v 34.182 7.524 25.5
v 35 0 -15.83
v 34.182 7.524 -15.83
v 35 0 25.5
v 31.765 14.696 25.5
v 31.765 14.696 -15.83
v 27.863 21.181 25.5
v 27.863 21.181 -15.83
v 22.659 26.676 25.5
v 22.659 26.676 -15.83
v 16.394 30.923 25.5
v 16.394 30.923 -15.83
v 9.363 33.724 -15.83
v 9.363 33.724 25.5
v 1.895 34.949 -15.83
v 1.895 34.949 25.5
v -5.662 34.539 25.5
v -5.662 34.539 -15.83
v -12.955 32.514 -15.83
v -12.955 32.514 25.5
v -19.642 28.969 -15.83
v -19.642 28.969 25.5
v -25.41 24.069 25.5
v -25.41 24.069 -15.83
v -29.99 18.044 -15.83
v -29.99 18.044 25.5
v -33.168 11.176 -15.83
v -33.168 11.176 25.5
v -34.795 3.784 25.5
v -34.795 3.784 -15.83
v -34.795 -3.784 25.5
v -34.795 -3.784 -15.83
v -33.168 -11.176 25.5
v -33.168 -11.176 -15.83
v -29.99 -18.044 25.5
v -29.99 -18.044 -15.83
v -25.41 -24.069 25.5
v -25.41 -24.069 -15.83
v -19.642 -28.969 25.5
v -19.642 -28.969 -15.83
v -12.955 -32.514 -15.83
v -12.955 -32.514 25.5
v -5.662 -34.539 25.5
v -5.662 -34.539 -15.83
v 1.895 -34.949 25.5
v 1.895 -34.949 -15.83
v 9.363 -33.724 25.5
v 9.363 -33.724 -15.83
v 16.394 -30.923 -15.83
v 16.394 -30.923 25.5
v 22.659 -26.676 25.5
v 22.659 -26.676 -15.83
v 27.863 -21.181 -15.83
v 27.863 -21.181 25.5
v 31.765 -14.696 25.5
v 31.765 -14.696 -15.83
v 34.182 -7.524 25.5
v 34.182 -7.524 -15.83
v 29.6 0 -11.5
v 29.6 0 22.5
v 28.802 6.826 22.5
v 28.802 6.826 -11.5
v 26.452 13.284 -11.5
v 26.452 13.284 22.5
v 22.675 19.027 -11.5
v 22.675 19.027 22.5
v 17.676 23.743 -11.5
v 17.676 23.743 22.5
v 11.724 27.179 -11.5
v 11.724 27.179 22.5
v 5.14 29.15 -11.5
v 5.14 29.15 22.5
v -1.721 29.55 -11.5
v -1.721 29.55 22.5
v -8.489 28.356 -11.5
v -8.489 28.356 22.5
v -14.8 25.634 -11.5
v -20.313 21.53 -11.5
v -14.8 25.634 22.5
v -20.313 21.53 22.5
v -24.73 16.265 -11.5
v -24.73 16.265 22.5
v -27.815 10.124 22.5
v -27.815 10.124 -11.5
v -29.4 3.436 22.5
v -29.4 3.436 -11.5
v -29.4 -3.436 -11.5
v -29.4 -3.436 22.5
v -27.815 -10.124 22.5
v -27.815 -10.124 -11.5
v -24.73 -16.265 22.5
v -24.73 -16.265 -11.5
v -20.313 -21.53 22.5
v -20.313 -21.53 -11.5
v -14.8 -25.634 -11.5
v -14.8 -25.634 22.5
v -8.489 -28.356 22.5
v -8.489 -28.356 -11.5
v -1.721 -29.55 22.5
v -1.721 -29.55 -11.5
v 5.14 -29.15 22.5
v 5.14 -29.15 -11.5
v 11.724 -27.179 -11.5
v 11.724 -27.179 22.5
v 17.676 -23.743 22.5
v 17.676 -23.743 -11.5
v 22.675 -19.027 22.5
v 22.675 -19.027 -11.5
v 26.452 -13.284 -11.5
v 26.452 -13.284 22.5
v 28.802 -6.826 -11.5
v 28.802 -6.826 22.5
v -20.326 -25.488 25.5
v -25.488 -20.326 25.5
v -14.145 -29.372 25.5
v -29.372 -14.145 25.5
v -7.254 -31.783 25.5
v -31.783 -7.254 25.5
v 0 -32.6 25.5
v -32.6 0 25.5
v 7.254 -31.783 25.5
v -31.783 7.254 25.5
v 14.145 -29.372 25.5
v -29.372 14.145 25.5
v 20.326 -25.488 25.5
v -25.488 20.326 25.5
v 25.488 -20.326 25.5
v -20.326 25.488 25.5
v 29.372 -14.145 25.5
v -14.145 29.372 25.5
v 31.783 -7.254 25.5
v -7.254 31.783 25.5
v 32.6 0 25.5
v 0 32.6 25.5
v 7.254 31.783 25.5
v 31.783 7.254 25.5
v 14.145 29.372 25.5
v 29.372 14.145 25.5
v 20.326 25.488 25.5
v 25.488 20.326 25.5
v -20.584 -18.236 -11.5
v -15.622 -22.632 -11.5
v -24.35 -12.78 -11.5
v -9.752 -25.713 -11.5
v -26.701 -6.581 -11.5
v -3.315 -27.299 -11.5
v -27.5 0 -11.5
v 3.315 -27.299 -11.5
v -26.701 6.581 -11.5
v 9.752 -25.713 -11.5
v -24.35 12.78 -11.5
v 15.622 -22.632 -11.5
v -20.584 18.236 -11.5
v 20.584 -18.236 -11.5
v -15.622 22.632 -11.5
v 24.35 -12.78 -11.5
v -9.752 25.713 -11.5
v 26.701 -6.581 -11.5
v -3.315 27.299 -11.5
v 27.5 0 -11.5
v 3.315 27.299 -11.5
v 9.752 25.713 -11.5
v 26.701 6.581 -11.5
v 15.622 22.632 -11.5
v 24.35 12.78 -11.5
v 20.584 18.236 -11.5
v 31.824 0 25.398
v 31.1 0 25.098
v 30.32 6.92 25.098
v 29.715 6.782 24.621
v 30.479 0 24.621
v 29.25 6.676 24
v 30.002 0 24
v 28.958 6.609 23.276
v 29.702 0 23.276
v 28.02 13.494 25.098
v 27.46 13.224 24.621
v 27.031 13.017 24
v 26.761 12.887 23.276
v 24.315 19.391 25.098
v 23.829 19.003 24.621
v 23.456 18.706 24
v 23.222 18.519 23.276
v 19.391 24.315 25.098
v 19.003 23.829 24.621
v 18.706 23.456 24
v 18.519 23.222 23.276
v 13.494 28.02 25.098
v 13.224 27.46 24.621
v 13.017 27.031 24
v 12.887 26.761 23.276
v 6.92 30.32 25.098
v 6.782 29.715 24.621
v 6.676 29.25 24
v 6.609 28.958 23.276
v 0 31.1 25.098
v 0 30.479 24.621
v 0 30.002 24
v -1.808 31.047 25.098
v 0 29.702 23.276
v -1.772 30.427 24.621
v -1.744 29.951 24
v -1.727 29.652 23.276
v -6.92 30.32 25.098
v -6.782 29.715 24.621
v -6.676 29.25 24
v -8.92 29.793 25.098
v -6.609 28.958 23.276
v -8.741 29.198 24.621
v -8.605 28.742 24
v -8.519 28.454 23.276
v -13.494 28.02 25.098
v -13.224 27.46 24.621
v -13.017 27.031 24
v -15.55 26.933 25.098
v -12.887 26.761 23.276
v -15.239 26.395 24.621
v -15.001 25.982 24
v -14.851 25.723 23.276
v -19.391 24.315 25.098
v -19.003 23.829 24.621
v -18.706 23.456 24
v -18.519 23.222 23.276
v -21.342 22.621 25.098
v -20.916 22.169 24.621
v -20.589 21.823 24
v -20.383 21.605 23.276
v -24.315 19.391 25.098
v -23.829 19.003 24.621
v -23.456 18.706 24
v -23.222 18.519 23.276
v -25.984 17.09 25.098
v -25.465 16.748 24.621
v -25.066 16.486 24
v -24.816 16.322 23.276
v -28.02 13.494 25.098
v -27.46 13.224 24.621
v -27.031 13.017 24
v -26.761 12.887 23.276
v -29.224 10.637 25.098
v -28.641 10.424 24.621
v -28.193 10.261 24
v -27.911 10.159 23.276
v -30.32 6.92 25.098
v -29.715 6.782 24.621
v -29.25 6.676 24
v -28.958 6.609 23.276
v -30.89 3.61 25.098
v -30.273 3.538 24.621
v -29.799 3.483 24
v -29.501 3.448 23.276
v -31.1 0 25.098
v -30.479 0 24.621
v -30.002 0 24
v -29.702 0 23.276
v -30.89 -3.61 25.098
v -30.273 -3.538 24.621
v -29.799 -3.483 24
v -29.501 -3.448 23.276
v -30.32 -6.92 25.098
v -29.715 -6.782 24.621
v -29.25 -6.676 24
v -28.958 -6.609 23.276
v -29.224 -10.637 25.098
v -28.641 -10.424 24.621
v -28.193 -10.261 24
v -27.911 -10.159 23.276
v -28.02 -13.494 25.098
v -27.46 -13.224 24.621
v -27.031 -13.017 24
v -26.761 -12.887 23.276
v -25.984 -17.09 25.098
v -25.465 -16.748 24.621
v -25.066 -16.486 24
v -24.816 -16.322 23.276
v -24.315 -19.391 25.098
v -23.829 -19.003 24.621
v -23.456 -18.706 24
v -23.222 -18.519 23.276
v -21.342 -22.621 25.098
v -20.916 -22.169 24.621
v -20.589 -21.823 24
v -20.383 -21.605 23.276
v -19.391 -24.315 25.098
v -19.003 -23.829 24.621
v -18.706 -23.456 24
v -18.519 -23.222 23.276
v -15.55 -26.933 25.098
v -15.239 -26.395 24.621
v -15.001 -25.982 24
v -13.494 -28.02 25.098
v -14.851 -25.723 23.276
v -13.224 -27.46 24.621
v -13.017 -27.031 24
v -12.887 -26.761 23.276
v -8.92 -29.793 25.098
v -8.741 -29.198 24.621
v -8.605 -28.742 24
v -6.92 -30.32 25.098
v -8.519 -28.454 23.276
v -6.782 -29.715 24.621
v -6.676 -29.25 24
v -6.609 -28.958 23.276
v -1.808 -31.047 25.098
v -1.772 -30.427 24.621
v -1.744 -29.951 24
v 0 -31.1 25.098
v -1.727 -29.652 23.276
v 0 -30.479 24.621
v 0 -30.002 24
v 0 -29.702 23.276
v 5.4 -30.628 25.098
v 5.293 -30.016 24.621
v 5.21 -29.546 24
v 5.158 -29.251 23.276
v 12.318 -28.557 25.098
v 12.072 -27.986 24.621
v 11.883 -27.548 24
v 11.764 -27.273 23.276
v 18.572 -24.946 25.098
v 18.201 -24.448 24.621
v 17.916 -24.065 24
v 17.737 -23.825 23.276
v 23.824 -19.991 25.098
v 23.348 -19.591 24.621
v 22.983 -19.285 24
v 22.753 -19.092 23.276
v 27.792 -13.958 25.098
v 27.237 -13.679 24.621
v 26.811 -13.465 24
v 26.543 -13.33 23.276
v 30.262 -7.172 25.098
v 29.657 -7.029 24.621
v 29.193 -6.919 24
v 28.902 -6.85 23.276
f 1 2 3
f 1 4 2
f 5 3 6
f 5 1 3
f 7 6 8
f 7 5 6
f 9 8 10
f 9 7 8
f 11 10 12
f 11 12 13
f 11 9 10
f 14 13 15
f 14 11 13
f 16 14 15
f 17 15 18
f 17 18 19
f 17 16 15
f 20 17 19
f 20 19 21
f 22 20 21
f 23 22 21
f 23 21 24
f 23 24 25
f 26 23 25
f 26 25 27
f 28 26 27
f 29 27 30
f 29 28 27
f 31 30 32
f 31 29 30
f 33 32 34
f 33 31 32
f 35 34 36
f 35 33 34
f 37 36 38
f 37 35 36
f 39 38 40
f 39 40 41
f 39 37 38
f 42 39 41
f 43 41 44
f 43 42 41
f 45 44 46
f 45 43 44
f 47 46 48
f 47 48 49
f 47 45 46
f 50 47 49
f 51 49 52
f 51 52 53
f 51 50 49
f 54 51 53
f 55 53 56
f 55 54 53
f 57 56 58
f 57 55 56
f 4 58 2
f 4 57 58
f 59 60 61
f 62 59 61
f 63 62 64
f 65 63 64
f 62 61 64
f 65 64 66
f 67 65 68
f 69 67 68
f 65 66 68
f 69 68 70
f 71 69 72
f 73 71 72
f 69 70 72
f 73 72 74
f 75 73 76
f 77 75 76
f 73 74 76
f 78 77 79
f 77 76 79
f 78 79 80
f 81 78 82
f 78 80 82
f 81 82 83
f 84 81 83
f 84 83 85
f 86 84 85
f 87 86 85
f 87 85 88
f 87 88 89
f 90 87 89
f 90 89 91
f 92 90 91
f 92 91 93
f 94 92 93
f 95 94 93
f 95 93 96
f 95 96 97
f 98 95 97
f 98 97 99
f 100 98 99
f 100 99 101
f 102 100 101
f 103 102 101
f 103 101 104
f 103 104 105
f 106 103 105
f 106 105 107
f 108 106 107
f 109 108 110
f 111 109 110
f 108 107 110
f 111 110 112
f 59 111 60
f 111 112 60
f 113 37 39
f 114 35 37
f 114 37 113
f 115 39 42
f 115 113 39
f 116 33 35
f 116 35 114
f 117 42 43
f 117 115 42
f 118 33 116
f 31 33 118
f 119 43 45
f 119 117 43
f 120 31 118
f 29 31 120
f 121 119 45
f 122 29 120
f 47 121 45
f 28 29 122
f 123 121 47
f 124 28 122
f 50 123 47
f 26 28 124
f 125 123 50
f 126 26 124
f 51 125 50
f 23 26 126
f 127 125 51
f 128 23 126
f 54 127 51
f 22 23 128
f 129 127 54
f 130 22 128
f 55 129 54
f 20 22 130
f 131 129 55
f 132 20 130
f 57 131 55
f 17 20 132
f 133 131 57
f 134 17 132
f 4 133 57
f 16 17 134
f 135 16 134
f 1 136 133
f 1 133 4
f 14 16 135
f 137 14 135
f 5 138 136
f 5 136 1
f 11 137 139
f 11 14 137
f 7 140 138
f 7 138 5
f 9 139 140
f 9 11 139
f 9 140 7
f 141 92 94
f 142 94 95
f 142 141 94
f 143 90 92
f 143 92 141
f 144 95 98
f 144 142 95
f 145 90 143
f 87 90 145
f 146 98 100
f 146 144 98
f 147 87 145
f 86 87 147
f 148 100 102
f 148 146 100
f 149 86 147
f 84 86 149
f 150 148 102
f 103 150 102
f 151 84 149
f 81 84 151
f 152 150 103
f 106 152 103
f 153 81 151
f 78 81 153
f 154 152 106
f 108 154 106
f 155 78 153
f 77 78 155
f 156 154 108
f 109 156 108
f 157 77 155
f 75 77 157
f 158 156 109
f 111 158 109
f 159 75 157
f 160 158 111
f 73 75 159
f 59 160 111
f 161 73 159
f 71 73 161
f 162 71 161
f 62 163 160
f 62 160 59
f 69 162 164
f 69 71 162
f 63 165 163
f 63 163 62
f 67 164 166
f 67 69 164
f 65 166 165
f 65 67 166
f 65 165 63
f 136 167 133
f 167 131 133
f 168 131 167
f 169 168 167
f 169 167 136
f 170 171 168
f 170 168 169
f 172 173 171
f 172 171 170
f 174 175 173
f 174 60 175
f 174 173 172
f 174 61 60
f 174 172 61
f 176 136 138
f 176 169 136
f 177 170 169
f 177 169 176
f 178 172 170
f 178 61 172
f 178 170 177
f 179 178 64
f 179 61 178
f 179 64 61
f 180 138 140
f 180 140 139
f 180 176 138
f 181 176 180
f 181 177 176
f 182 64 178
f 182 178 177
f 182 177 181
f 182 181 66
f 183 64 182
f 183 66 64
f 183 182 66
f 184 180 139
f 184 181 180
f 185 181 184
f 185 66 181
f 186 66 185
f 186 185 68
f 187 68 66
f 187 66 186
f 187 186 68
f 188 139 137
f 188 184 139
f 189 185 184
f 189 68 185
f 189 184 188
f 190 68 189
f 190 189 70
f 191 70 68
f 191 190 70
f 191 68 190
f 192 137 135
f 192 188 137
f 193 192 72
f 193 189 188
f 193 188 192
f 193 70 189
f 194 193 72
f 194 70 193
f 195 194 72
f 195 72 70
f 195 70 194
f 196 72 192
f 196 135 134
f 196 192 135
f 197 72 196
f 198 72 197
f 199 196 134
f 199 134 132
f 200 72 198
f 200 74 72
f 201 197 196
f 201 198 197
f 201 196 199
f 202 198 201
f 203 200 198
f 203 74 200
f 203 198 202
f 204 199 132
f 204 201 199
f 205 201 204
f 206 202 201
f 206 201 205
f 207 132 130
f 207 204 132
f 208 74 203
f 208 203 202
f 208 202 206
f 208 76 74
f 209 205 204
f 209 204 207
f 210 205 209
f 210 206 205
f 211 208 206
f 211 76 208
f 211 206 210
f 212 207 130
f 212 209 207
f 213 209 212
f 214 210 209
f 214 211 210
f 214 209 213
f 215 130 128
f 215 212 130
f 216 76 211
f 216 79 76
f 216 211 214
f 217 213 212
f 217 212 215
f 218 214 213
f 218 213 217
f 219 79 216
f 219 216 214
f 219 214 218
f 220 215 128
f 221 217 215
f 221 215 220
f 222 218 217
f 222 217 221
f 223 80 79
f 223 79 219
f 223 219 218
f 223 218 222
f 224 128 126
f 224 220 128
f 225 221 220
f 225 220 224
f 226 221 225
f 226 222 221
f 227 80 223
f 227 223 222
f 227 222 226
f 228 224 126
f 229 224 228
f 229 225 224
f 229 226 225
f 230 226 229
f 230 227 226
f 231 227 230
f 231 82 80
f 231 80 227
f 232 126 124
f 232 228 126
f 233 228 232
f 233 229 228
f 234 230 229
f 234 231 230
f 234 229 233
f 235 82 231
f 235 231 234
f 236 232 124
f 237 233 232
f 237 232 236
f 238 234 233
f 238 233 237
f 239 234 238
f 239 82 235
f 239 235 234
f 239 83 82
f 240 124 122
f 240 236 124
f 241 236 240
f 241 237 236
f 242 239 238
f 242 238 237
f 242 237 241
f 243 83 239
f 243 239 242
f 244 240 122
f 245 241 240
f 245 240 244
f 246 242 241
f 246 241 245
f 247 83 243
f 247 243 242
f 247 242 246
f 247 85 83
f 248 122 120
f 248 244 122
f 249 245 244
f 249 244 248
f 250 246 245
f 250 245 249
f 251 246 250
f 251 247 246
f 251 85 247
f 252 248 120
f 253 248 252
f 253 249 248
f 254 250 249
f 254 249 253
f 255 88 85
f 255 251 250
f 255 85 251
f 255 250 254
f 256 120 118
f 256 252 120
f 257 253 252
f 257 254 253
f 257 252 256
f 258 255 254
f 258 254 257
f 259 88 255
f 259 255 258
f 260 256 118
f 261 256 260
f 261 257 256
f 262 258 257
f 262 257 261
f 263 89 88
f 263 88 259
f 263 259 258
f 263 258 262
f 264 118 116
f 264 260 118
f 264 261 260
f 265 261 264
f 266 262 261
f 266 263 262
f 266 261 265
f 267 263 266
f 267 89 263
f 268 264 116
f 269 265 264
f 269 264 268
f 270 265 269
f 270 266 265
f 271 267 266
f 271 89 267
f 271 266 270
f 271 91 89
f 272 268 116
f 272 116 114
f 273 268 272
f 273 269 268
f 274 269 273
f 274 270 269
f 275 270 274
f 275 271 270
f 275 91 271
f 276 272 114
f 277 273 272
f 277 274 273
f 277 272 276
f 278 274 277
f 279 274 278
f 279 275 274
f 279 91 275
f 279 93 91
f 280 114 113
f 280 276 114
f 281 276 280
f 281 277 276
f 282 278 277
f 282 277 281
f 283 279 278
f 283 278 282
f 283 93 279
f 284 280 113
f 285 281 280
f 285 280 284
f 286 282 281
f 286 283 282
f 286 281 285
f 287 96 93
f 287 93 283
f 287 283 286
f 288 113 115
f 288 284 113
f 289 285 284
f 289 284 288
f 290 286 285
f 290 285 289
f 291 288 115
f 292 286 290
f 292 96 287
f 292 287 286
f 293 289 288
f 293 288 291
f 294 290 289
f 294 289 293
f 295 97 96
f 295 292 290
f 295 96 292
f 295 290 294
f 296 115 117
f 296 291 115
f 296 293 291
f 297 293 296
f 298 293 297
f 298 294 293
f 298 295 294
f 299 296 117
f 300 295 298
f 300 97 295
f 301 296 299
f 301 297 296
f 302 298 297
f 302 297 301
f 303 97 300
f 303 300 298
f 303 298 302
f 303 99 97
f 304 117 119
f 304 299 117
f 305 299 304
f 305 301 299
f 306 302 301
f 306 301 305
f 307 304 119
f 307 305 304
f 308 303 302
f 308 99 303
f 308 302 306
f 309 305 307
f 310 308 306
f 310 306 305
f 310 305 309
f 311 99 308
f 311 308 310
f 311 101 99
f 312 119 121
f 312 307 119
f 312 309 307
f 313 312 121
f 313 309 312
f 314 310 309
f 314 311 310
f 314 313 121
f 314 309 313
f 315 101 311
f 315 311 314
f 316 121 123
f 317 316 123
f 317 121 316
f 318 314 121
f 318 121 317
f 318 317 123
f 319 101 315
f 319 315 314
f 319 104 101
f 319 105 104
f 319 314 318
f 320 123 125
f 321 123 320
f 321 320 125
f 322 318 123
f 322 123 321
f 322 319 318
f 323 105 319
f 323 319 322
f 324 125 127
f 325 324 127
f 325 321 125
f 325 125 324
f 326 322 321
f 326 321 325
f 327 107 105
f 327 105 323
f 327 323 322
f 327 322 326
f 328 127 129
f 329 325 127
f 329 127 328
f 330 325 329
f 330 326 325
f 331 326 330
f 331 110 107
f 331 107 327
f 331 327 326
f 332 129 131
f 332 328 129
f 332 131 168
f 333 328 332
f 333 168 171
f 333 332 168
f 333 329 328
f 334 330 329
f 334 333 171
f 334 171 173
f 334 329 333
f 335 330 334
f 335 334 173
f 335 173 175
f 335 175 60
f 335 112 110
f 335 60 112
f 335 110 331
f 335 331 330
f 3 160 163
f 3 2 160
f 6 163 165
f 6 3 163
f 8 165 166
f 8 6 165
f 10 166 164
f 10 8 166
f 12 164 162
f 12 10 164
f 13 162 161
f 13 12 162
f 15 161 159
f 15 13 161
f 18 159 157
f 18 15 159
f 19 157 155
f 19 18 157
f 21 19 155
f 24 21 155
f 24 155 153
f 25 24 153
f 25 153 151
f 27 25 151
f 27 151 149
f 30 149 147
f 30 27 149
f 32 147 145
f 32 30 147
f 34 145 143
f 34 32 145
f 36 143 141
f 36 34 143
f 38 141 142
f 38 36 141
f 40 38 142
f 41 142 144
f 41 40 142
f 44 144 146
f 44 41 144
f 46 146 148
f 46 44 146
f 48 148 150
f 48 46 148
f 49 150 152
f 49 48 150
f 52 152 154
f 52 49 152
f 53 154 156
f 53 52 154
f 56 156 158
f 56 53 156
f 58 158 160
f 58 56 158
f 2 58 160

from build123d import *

# Parameters (mm, degrees)
SKETCH1_R           = 31
SKETCH1_R_2         = 29.75
BOSS_EXTRUDE1_DEPTH = 29
SKETCH2_R           = 32.5
SKETCH2_R_2         = 29.6
BOSS_EXTRUDE3_DEPTH = 35
FILLET2_R           = 2
SKETCH3_R           = 32.5
CUT_EXTRUDE1_DEPTH  = 3.5
SKETCH4_R           = 29.6
SKETCH4_R_2         = 27.5
BOSS_EXTRUDE4_DEPTH = 15
CUT_EXTRUDE2_START  = -33
SKETCH5_R           = 29.6
CUT_EXTRUDE2_DEPTH  = 33
SKETCH6_R           = 35
SKETCH6_R_2         = 29.6
BOSS_EXTRUDE5_DEPTH = 37
FILLET3_R           = 3


with BuildPart() as part:
    # Sketch1 → Boss-Extrude1 (new body)
    with BuildSketch(Plane.XY):
        with Locations(Location((0, 0, 0), (0, 0, 180))):
            Circle(SKETCH1_R)
        with Locations(Location((0, 0, 0), (0, 0, 180))):
            Circle(SKETCH1_R_2, mode=Mode.SUBTRACT)
    extrude(amount=BOSS_EXTRUDE1_DEPTH)

    # Sketch2 → Boss-Extrude3 (add)
    with BuildSketch(Plane.XY.offset(29)):
        Circle(SKETCH2_R)
        Circle(SKETCH2_R_2, mode=Mode.SUBTRACT)
    extrude(amount=-BOSS_EXTRUDE3_DEPTH)

    # Fillet2
    fillet2_edges = [part.edges().sort_by_distance(p)[0] for p in [
        (-29.6, 0, -6),
    ]]
    fillet(fillet2_edges, radius=FILLET2_R)

    # Sketch3 → Cut-Extrude1 (cut)
    with BuildSketch(Plane.XY.offset(29)):
        Circle(SKETCH3_R)
    extrude(amount=-CUT_EXTRUDE1_DEPTH, mode=Mode.SUBTRACT)

    # Sketch4 → Boss-Extrude4 (add)
    with BuildSketch(Plane.XY.offset(25.5)):
        Circle(SKETCH4_R)
        Circle(SKETCH4_R_2, mode=Mode.SUBTRACT)
    extrude(amount=-BOSS_EXTRUDE4_DEPTH)

    # Sketch5 → Cut-Extrude2 (cut)
    with BuildSketch(Plane(origin=(0, 0, 10.5), x_dir=(-1, 0, 0), z_dir=(0, 0, -1)).offset(CUT_EXTRUDE2_START)):
        with Locations(Location((0, 0, 0), (0, 0, 180))):
            Circle(SKETCH5_R)
    extrude(amount=CUT_EXTRUDE2_DEPTH, mode=Mode.SUBTRACT)

    # Sketch6 → Boss-Extrude5 (add)
    with BuildSketch(Plane.XY.offset(25.5)):
        Circle(SKETCH6_R)
        Circle(SKETCH6_R_2, mode=Mode.SUBTRACT)
    extrude(amount=-BOSS_EXTRUDE5_DEPTH)

    # Sketch7 → Revolve1 (revolve)
    with BuildSketch(Plane(origin=(0, 0, 0), x_dir=(1, 0, 0), z_dir=(0, 1, 0)), mode=Mode.PRIVATE) as revolve1_sk:
        Polygon((-27.5, 11.5), (-35, 15.830127019), (-35, 11.5), align=None)
    revolve(revolve1_sk.sketch.rotate(Axis((0, 0, -15.830127019), (0, 0, 1)), 180), axis=Axis((0, 0, -15.830127019), (0, 0, 1)))

    # Fillet3
    fillet3_edges = [part.edges().sort_by_distance(p)[0] for p in [
        (-29.6, 0, 25.5),
    ]]
    fillet(fillet3_edges, radius=FILLET3_R)


solid = part.part
